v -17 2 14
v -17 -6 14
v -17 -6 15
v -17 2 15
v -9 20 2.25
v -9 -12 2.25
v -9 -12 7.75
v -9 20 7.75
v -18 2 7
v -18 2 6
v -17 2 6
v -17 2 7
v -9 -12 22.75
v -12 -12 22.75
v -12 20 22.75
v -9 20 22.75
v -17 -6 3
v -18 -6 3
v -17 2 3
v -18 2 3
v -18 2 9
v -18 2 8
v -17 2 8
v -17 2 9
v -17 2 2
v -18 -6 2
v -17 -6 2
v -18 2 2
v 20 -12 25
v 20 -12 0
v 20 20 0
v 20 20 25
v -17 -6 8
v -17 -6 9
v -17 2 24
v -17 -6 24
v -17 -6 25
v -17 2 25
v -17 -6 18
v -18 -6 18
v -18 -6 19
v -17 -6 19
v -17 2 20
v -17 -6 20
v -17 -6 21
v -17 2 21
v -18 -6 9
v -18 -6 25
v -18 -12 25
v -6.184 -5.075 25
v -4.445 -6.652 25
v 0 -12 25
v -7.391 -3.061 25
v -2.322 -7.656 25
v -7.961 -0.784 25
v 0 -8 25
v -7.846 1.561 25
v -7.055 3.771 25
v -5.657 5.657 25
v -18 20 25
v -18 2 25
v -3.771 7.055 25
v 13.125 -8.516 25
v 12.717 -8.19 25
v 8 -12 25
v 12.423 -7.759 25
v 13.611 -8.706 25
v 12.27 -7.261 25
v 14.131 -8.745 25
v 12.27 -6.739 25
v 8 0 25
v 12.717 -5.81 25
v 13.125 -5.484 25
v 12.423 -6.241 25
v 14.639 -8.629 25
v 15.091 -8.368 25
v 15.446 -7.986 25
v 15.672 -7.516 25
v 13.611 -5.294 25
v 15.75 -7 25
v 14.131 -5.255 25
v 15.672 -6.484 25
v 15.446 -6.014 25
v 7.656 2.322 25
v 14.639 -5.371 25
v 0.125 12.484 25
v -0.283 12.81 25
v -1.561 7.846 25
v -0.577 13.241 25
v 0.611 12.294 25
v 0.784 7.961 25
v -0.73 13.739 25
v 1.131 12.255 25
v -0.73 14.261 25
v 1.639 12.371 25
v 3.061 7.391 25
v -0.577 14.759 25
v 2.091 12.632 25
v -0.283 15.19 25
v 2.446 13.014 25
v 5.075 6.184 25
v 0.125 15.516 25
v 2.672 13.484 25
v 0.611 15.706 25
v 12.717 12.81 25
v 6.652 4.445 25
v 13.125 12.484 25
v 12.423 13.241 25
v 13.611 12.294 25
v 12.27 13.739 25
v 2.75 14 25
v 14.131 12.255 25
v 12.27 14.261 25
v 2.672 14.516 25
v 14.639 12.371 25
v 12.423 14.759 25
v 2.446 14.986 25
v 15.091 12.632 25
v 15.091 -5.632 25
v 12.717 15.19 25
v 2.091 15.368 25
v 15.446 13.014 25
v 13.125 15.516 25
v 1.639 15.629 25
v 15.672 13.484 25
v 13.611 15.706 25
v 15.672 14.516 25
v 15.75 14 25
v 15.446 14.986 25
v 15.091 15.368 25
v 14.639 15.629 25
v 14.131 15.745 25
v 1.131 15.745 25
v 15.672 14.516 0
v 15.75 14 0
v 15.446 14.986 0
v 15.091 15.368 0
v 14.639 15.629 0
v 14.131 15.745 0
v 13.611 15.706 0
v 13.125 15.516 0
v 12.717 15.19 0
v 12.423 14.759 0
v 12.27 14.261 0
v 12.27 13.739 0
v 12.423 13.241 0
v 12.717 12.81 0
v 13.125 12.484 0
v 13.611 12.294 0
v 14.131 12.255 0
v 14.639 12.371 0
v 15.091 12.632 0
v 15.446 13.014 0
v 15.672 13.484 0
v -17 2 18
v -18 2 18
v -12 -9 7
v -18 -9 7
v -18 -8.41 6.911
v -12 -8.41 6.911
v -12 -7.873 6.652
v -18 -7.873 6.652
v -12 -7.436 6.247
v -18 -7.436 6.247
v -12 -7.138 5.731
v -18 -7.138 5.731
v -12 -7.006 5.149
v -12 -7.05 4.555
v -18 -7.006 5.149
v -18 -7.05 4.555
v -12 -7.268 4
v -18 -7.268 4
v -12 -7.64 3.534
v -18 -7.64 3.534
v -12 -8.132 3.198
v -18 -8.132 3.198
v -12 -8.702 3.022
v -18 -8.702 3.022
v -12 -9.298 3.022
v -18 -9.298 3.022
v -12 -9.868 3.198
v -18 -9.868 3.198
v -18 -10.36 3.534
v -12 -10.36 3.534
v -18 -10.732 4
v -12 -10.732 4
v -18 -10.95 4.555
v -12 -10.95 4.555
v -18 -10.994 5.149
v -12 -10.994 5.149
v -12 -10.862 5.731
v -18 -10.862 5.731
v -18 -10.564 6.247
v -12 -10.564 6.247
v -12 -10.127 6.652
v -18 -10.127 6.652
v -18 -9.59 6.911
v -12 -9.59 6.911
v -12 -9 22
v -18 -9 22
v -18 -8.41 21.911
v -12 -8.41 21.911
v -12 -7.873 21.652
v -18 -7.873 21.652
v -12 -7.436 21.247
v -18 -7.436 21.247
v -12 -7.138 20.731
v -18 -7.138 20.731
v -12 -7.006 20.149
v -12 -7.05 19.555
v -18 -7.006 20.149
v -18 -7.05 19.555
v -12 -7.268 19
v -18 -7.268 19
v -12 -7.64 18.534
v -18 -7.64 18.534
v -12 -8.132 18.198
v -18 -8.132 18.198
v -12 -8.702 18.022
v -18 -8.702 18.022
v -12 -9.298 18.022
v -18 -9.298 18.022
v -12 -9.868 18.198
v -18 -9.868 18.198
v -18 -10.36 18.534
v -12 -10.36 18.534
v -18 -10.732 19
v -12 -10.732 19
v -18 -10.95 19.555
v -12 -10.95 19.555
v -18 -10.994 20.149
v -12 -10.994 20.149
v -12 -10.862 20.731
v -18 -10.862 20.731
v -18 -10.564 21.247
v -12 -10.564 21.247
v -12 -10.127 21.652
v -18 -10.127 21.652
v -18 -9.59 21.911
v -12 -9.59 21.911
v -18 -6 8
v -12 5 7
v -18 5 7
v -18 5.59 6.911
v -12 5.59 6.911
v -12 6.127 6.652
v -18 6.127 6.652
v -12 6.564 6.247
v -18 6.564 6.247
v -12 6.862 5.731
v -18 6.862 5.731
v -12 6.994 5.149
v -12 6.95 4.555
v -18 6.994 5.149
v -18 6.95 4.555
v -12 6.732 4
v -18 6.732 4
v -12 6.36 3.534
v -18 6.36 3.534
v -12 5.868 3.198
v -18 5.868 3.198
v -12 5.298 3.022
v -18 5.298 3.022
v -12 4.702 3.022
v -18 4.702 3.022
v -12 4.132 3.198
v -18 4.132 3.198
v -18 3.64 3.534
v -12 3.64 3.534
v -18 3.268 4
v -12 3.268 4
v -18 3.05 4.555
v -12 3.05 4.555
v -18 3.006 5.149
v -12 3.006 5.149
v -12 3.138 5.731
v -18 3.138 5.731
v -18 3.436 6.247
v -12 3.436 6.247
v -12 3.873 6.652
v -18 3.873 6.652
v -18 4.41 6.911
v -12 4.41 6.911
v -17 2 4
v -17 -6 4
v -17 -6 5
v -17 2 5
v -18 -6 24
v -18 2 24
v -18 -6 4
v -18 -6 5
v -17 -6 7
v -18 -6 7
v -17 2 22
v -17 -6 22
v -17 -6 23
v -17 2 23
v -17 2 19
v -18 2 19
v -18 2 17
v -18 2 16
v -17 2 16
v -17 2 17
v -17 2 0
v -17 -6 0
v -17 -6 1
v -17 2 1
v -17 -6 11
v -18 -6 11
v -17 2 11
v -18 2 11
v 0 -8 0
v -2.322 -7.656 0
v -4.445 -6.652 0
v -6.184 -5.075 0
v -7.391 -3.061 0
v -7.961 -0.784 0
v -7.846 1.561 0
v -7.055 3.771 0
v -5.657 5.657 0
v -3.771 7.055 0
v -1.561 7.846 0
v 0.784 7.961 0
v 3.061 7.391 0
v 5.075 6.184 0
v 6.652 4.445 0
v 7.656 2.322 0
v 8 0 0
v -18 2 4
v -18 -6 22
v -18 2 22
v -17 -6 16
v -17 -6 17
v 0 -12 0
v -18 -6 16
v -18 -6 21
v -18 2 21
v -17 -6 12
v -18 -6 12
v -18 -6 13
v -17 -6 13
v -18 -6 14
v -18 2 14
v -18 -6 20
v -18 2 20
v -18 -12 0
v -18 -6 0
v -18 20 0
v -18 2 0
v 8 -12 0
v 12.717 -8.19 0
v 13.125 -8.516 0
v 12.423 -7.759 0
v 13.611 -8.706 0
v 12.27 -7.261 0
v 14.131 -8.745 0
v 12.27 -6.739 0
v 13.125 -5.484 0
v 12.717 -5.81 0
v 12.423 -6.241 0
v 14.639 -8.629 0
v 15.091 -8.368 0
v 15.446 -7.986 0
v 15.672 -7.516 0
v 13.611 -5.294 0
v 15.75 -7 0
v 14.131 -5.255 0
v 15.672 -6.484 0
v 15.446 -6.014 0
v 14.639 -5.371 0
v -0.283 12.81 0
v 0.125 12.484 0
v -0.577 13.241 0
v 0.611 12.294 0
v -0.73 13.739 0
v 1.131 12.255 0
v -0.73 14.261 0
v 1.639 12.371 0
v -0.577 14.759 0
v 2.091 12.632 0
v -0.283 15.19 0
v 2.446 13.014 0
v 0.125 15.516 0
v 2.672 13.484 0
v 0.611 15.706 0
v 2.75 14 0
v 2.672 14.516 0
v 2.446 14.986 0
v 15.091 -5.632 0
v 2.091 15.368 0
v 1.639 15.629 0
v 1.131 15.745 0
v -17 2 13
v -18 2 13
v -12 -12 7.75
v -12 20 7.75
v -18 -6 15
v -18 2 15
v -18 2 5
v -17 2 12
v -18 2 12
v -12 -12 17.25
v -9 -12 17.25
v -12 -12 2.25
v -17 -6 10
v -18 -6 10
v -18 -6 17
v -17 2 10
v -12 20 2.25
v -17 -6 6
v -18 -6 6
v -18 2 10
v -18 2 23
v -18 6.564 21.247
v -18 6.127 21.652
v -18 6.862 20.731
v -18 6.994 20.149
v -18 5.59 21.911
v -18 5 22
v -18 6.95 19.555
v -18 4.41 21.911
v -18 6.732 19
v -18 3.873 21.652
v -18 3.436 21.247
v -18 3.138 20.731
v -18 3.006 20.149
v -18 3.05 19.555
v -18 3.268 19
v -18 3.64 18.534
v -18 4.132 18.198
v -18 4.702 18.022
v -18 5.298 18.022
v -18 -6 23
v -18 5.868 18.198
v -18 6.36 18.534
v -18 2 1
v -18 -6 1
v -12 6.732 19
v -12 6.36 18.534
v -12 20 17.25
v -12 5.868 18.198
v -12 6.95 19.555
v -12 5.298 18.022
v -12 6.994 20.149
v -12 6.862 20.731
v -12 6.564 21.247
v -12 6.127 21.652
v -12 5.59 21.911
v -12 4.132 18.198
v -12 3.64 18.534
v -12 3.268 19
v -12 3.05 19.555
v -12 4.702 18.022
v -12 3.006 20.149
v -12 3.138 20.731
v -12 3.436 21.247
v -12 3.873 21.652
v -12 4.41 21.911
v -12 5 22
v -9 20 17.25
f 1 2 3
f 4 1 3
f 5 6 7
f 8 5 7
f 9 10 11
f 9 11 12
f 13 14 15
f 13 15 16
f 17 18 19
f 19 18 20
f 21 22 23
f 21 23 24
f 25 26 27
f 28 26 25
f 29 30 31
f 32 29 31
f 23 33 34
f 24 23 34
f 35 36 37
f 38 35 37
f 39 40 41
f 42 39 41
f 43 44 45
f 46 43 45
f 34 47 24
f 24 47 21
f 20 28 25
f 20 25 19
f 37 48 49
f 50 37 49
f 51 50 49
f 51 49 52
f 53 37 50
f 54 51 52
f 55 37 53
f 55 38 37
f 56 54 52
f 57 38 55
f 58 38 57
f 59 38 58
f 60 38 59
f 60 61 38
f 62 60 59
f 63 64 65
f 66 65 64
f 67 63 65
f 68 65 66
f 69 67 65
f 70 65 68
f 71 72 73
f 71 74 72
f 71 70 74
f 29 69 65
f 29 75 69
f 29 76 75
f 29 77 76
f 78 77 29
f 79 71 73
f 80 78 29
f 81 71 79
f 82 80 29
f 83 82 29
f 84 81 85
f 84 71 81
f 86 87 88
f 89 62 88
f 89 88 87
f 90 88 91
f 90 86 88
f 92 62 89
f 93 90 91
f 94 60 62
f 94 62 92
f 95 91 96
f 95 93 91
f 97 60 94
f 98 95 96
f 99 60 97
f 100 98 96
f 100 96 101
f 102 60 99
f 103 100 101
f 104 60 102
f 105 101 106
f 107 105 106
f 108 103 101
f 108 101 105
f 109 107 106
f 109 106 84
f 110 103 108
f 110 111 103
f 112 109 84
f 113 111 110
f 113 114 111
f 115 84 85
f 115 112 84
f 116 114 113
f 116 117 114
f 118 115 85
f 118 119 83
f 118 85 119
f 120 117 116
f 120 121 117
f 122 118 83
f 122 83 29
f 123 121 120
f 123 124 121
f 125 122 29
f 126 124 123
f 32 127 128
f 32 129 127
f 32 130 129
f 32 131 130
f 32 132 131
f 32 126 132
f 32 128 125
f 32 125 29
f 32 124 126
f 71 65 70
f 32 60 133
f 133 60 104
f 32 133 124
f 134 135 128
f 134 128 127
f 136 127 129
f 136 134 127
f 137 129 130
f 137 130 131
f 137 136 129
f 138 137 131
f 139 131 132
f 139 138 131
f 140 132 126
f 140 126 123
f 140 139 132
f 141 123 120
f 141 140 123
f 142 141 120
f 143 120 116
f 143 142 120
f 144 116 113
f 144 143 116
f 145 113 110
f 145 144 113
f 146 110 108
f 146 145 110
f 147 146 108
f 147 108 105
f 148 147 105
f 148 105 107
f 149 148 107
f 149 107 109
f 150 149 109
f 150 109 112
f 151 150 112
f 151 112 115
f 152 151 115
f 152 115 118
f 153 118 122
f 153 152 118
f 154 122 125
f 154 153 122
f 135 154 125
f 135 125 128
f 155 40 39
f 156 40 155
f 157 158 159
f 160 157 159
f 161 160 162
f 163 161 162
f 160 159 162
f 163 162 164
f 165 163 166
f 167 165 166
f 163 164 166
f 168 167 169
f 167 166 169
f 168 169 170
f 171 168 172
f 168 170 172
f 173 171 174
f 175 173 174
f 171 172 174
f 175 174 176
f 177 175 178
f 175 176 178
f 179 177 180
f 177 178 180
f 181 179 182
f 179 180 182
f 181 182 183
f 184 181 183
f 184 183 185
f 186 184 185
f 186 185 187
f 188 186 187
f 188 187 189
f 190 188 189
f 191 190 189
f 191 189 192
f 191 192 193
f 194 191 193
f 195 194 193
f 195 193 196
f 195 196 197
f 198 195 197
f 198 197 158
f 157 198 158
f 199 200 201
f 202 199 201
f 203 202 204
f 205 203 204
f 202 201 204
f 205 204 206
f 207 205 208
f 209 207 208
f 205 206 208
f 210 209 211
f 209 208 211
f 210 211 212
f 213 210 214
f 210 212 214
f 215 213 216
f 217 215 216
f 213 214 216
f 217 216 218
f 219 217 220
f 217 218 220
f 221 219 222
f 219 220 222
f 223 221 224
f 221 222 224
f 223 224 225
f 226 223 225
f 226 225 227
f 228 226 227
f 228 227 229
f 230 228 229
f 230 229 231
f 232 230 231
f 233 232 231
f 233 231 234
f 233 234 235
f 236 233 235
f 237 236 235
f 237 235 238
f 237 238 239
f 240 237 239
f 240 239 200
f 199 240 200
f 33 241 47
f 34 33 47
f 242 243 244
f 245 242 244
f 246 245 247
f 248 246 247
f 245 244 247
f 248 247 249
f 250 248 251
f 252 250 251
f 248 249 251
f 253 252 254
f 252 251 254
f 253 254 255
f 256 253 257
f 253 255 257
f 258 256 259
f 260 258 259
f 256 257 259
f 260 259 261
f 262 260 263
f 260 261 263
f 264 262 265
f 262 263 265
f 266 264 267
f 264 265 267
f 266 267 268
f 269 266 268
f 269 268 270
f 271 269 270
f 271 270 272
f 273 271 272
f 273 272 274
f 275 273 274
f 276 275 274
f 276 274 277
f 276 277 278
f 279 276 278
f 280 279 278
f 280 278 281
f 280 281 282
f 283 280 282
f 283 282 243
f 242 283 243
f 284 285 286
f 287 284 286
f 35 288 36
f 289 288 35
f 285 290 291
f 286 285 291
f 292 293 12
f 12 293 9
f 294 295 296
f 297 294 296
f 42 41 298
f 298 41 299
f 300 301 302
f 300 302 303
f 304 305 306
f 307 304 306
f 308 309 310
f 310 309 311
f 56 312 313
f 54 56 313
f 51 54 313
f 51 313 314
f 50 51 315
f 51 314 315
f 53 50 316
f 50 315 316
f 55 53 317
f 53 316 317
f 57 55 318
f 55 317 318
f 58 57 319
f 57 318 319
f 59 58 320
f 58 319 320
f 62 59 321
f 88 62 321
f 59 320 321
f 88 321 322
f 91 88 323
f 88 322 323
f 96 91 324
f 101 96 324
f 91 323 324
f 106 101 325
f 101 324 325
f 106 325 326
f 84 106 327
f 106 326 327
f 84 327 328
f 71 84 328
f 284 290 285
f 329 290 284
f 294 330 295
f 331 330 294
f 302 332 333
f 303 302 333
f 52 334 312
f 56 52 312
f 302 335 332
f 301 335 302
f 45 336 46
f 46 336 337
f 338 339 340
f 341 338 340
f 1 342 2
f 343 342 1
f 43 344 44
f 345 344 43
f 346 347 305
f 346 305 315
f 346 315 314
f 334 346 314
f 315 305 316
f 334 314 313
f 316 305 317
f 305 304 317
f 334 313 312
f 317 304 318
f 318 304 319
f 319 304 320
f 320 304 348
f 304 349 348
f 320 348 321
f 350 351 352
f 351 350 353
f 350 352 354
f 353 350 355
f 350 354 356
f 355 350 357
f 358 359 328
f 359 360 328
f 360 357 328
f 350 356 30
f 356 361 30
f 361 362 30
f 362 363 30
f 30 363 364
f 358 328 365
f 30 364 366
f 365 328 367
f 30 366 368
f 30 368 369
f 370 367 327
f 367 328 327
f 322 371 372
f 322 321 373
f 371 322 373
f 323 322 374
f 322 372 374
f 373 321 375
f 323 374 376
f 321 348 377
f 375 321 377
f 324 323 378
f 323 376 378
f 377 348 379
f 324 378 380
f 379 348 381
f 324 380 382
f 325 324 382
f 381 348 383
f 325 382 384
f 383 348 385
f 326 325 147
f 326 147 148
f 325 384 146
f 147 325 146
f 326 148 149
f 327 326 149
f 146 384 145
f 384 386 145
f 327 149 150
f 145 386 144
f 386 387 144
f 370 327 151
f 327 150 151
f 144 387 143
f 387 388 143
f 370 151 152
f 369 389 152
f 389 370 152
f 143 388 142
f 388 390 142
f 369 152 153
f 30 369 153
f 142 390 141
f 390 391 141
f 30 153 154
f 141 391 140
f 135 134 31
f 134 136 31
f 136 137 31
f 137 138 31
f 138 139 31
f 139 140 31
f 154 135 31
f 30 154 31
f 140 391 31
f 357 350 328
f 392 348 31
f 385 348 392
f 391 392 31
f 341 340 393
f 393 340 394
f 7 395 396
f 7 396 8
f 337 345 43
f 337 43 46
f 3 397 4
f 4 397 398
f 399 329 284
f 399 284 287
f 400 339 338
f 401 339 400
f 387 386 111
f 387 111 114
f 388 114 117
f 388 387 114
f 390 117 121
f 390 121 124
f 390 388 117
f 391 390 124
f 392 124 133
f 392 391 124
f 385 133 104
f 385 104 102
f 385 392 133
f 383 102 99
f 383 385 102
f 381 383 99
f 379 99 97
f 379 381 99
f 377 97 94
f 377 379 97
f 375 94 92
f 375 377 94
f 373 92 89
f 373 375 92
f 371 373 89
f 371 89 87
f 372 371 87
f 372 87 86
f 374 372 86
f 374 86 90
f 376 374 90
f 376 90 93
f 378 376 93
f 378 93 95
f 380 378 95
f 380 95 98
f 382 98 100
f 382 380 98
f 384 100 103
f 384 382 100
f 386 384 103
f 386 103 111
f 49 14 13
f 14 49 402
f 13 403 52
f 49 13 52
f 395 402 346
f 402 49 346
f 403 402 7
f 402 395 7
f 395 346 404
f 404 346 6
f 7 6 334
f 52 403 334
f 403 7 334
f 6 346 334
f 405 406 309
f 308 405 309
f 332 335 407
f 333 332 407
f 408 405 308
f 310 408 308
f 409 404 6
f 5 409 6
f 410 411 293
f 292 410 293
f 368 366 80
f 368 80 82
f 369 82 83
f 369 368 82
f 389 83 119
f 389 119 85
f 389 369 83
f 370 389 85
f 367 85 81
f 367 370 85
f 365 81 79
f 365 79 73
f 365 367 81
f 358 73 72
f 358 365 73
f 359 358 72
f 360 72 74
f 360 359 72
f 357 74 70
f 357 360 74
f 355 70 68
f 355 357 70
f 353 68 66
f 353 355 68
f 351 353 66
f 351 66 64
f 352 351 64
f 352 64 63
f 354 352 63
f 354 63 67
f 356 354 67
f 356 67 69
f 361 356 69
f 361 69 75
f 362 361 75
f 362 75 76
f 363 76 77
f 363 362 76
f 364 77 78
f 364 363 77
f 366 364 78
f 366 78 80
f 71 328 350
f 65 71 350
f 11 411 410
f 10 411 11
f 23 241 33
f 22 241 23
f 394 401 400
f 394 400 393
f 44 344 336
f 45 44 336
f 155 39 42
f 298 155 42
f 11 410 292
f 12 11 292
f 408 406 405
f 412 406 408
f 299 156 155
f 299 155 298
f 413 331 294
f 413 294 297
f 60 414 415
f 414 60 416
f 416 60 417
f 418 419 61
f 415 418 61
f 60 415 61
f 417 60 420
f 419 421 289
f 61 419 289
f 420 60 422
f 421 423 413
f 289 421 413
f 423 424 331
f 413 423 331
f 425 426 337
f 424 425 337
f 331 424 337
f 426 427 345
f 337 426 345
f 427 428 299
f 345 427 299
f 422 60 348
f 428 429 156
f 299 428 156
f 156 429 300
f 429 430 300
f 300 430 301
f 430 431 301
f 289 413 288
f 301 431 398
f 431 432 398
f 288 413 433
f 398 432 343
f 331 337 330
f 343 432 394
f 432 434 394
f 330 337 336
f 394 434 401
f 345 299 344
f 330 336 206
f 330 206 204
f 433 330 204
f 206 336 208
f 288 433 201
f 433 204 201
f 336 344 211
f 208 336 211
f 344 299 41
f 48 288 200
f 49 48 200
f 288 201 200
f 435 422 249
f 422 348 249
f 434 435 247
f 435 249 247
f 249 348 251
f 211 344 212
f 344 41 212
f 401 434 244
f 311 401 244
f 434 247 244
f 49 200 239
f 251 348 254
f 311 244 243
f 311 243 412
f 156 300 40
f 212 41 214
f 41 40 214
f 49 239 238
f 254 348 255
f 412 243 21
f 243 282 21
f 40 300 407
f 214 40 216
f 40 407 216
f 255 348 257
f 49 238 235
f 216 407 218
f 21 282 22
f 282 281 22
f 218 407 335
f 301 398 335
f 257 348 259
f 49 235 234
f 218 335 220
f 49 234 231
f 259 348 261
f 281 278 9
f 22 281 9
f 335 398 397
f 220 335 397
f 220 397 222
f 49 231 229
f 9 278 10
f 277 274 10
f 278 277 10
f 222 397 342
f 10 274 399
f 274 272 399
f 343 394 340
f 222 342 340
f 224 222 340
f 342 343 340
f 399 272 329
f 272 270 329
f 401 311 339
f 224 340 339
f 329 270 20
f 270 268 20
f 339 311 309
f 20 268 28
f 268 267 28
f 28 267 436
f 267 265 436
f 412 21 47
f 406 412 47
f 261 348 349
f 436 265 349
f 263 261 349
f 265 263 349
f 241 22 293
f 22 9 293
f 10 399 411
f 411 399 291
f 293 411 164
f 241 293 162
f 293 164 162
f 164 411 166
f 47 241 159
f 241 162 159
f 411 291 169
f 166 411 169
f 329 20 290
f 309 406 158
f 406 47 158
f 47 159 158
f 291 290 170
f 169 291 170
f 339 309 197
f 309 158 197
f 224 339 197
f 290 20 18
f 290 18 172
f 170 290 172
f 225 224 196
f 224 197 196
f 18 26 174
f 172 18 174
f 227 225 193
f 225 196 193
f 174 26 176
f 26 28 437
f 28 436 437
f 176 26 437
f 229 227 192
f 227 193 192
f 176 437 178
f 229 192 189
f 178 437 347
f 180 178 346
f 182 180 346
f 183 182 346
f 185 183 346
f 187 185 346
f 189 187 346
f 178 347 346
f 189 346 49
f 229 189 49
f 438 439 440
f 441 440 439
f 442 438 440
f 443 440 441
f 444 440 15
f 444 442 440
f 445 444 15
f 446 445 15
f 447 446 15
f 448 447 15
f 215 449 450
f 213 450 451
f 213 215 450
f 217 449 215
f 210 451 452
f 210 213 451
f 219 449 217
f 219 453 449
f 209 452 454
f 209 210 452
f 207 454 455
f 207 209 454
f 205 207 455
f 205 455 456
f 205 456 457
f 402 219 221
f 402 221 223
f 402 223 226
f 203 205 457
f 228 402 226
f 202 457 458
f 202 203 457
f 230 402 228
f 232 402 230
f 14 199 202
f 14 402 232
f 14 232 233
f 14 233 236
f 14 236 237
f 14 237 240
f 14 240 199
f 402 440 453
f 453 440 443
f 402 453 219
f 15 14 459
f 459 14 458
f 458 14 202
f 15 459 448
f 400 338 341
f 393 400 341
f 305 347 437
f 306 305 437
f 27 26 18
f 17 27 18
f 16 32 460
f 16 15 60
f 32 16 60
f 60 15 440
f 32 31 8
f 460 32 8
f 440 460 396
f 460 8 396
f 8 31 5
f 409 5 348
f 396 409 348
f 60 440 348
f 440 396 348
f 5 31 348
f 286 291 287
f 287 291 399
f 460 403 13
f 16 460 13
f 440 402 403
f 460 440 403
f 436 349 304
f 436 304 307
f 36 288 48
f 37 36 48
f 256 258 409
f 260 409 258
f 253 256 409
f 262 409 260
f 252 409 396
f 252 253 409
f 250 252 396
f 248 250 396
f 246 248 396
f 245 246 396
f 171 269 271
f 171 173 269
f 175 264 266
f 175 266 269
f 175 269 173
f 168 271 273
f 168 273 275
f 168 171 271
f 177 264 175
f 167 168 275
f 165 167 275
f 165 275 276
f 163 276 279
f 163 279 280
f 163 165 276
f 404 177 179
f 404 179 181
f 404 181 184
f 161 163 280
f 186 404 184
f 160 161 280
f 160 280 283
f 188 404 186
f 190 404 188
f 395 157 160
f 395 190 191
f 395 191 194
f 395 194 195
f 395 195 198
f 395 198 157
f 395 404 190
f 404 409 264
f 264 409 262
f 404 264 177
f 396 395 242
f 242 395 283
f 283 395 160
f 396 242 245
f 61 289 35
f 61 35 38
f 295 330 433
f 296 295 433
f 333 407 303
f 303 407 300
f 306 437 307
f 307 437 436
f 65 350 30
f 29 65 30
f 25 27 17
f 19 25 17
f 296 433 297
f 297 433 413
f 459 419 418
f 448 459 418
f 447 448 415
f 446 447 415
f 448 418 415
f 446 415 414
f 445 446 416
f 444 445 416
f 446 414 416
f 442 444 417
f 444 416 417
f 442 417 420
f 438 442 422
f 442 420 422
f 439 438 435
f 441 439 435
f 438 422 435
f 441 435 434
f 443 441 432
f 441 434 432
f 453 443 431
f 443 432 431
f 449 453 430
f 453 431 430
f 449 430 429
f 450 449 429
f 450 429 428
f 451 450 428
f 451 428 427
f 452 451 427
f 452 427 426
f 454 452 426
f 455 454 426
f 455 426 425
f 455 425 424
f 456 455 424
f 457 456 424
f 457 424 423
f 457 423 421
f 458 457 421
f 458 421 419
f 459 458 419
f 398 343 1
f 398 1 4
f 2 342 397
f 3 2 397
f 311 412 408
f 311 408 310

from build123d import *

# Parameters (mm, degrees)
SKETCH_2_R          = 1.75
EXTRUDE_1_DEPTH     = 25
SKETCH_3_W          = 1
SKETCH_3_H          = 8
CUT_EXTRUDE_1_DEPTH = 1
SKETCH_4_R          = 2
CUT_EXTRUDE_2_DEPTH = 9
SKETCH_5_W          = 3
SKETCH_5_H          = 5.5
CUT_EXTRUDE_3_DEPTH = 33


with BuildPart() as part:
    # Эскиз2 → Бобышка-Вытянуть1 (new body)
    with BuildSketch(Plane.XY):
        with BuildLine():
            Line((8, 0), (8, -12))
            Line((8, -12), (20, -12))
            Line((20, -12), (20, 20))
            Line((20, 20), (-18, 20))
            Line((-18, 20), (-18, -12))
            Line((-18, -12), (0, -12))
            Line((0, -12), (0, -8))
            ThreePointArc((0, -8), (-5.656854249, 5.656854249), (8, 0))
        make_face()
        with Locations((1, 14)):
            Circle(SKETCH_2_R, mode=Mode.SUBTRACT)
        with Locations((14, -7)):
            Circle(SKETCH_2_R, mode=Mode.SUBTRACT)
        with Locations((14, 14)):
            Circle(SKETCH_2_R, mode=Mode.SUBTRACT)
    extrude(amount=EXTRUDE_1_DEPTH)

    # Эскиз3 → Вырез-Вытянуть1 (cut)
    with BuildSketch(Plane.ZY.offset(18)):
        with Locations((0.5, -2)):
            Rectangle(SKETCH_3_W, SKETCH_3_H)
        with Locations((2.5, -2)):
            Rectangle(SKETCH_3_W, SKETCH_3_H)
        with Locations((4.5, -2)):
            Rectangle(SKETCH_3_W, SKETCH_3_H)
        with Locations((6.5, -2)):
            Rectangle(SKETCH_3_W, SKETCH_3_H)
        with Locations((8.5, -2)):
            Rectangle(SKETCH_3_W, SKETCH_3_H)
        with Locations((10.5, -2)):
            Rectangle(SKETCH_3_W, SKETCH_3_H)
        with Locations((12.5, -2)):
            Rectangle(SKETCH_3_W, SKETCH_3_H)
        with Locations((14.5, -2)):
            Rectangle(SKETCH_3_W, SKETCH_3_H)
        with Locations((16.5, -2)):
            Rectangle(SKETCH_3_W, SKETCH_3_H)
        with Locations((18.5, -2)):
            Rectangle(SKETCH_3_W, SKETCH_3_H)
        with Locations((20.5, -2)):
            Rectangle(SKETCH_3_W, SKETCH_3_H)
        with Locations((22.5, -2)):
            Rectangle(SKETCH_3_W, SKETCH_3_H)
        with Locations((24.5, -2)):
            Rectangle(SKETCH_3_W, SKETCH_3_H)
    extrude(amount=-CUT_EXTRUDE_1_DEPTH, mode=Mode.SUBTRACT)

    # Эскиз4 → Вырез-Вытянуть2 (cut)
    with BuildSketch(Plane.ZY.offset(18)):
        with Locations((5, 5)):
            Circle(SKETCH_4_R)
        with Locations((20, 5)):
            Circle(SKETCH_4_R)
        with Locations((20, -9)):
            Circle(SKETCH_4_R)
        with Locations((5, -9)):
            Circle(SKETCH_4_R)
    extrude(amount=-CUT_EXTRUDE_2_DEPTH, mode=Mode.SUBTRACT)

    # Эскиз5 → Вырез-Вытянуть3 (cut, through all)
    with BuildSketch(Plane.XZ.offset(12)):
        with Locations((-10.5, 5)):
            Rectangle(SKETCH_5_W, SKETCH_5_H)
        with Locations((-10.5, 20)):
            Rectangle(SKETCH_5_W, SKETCH_5_H)
    extrude(amount=-CUT_EXTRUDE_3_DEPTH, mode=Mode.SUBTRACT)


solid = part.part
